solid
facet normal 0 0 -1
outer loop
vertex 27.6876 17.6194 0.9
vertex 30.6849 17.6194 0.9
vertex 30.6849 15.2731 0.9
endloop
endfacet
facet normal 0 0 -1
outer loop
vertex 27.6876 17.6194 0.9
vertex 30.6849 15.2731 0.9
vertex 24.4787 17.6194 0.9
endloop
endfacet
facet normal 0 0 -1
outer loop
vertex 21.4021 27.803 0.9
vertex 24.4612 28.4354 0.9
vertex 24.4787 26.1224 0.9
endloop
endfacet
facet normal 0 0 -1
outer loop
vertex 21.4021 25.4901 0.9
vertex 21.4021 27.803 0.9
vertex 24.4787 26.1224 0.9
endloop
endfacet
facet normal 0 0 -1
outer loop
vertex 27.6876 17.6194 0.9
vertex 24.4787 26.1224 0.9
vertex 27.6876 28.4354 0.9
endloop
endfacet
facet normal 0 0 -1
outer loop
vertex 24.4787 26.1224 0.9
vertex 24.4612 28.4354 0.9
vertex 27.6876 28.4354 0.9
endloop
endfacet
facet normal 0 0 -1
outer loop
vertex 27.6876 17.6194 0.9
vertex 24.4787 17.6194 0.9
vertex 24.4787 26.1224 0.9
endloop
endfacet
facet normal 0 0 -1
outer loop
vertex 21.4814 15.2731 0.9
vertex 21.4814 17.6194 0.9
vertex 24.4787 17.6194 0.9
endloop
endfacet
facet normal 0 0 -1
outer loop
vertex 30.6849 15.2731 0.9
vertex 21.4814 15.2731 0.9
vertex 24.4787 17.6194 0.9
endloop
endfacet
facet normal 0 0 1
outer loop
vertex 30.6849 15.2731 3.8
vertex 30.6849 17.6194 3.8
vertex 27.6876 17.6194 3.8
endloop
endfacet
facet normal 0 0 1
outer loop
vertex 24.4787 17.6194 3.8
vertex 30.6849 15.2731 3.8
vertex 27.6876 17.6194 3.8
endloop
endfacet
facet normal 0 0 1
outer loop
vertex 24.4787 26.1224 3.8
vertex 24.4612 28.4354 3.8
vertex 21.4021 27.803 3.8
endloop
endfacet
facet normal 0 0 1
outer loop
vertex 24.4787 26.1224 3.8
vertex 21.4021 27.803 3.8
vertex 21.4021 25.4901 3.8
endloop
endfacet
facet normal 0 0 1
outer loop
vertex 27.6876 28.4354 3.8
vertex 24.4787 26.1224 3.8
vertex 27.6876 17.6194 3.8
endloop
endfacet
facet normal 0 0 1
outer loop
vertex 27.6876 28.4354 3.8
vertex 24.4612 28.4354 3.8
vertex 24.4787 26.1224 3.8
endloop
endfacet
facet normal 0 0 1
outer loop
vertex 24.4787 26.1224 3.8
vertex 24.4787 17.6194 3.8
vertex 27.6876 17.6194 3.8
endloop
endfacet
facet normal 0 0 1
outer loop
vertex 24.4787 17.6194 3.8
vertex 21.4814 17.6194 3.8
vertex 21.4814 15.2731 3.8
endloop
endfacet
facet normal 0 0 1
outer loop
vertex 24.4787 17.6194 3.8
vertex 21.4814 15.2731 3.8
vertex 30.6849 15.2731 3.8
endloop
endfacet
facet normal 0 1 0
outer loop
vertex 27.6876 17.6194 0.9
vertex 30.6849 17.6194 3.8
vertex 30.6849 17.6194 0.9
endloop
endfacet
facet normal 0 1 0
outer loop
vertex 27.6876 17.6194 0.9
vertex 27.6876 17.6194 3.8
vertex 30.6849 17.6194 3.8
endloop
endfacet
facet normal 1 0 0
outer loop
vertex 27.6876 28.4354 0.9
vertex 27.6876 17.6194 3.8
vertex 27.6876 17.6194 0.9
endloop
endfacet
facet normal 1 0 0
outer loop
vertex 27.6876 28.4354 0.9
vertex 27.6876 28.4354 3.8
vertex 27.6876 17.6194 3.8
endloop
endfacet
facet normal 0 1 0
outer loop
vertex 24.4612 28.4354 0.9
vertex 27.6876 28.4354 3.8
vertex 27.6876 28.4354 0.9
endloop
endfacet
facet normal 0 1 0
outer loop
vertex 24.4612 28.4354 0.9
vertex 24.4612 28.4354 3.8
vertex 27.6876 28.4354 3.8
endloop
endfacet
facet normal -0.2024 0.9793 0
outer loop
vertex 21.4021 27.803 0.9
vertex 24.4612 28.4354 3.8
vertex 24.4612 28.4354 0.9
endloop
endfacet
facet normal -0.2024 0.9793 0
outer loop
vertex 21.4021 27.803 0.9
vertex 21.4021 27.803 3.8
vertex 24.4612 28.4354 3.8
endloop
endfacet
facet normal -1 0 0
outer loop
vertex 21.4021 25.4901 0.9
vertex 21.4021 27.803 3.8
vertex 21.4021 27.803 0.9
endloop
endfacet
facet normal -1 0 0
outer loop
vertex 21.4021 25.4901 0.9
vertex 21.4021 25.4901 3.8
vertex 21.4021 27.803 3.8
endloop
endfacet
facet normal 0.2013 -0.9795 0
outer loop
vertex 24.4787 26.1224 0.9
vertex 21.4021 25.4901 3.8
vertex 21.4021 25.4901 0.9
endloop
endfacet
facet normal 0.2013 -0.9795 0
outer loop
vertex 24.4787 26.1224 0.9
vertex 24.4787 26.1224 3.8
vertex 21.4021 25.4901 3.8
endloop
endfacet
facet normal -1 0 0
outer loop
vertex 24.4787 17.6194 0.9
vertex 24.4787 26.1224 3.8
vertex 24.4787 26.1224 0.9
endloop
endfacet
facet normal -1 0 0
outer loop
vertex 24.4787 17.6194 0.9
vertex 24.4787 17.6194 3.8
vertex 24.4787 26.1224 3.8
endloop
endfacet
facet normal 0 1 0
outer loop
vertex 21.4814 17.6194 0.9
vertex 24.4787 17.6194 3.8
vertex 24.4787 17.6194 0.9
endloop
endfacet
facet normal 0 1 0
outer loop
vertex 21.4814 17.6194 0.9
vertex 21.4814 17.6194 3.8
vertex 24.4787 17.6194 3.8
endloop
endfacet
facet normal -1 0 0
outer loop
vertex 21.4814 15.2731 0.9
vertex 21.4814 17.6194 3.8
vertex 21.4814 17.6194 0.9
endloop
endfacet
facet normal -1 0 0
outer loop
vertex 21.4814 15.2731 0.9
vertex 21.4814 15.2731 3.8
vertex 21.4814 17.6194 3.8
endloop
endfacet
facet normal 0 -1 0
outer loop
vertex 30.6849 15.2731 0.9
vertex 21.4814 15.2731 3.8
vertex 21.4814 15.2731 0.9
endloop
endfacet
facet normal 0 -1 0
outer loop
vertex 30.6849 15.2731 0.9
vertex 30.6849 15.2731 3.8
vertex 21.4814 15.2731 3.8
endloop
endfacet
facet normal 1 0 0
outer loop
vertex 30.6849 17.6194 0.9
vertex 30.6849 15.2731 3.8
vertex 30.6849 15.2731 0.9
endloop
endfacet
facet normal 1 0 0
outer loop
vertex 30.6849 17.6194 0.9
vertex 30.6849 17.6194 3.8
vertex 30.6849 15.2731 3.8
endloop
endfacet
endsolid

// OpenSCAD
$fn = 48;
  translate([25.500, 21.700, 0.900])
    linear_extrude(height=2.900)
      text("1", size=13.000, halign="center", valign="center", font="Helvetica Neue:style=Bold");
